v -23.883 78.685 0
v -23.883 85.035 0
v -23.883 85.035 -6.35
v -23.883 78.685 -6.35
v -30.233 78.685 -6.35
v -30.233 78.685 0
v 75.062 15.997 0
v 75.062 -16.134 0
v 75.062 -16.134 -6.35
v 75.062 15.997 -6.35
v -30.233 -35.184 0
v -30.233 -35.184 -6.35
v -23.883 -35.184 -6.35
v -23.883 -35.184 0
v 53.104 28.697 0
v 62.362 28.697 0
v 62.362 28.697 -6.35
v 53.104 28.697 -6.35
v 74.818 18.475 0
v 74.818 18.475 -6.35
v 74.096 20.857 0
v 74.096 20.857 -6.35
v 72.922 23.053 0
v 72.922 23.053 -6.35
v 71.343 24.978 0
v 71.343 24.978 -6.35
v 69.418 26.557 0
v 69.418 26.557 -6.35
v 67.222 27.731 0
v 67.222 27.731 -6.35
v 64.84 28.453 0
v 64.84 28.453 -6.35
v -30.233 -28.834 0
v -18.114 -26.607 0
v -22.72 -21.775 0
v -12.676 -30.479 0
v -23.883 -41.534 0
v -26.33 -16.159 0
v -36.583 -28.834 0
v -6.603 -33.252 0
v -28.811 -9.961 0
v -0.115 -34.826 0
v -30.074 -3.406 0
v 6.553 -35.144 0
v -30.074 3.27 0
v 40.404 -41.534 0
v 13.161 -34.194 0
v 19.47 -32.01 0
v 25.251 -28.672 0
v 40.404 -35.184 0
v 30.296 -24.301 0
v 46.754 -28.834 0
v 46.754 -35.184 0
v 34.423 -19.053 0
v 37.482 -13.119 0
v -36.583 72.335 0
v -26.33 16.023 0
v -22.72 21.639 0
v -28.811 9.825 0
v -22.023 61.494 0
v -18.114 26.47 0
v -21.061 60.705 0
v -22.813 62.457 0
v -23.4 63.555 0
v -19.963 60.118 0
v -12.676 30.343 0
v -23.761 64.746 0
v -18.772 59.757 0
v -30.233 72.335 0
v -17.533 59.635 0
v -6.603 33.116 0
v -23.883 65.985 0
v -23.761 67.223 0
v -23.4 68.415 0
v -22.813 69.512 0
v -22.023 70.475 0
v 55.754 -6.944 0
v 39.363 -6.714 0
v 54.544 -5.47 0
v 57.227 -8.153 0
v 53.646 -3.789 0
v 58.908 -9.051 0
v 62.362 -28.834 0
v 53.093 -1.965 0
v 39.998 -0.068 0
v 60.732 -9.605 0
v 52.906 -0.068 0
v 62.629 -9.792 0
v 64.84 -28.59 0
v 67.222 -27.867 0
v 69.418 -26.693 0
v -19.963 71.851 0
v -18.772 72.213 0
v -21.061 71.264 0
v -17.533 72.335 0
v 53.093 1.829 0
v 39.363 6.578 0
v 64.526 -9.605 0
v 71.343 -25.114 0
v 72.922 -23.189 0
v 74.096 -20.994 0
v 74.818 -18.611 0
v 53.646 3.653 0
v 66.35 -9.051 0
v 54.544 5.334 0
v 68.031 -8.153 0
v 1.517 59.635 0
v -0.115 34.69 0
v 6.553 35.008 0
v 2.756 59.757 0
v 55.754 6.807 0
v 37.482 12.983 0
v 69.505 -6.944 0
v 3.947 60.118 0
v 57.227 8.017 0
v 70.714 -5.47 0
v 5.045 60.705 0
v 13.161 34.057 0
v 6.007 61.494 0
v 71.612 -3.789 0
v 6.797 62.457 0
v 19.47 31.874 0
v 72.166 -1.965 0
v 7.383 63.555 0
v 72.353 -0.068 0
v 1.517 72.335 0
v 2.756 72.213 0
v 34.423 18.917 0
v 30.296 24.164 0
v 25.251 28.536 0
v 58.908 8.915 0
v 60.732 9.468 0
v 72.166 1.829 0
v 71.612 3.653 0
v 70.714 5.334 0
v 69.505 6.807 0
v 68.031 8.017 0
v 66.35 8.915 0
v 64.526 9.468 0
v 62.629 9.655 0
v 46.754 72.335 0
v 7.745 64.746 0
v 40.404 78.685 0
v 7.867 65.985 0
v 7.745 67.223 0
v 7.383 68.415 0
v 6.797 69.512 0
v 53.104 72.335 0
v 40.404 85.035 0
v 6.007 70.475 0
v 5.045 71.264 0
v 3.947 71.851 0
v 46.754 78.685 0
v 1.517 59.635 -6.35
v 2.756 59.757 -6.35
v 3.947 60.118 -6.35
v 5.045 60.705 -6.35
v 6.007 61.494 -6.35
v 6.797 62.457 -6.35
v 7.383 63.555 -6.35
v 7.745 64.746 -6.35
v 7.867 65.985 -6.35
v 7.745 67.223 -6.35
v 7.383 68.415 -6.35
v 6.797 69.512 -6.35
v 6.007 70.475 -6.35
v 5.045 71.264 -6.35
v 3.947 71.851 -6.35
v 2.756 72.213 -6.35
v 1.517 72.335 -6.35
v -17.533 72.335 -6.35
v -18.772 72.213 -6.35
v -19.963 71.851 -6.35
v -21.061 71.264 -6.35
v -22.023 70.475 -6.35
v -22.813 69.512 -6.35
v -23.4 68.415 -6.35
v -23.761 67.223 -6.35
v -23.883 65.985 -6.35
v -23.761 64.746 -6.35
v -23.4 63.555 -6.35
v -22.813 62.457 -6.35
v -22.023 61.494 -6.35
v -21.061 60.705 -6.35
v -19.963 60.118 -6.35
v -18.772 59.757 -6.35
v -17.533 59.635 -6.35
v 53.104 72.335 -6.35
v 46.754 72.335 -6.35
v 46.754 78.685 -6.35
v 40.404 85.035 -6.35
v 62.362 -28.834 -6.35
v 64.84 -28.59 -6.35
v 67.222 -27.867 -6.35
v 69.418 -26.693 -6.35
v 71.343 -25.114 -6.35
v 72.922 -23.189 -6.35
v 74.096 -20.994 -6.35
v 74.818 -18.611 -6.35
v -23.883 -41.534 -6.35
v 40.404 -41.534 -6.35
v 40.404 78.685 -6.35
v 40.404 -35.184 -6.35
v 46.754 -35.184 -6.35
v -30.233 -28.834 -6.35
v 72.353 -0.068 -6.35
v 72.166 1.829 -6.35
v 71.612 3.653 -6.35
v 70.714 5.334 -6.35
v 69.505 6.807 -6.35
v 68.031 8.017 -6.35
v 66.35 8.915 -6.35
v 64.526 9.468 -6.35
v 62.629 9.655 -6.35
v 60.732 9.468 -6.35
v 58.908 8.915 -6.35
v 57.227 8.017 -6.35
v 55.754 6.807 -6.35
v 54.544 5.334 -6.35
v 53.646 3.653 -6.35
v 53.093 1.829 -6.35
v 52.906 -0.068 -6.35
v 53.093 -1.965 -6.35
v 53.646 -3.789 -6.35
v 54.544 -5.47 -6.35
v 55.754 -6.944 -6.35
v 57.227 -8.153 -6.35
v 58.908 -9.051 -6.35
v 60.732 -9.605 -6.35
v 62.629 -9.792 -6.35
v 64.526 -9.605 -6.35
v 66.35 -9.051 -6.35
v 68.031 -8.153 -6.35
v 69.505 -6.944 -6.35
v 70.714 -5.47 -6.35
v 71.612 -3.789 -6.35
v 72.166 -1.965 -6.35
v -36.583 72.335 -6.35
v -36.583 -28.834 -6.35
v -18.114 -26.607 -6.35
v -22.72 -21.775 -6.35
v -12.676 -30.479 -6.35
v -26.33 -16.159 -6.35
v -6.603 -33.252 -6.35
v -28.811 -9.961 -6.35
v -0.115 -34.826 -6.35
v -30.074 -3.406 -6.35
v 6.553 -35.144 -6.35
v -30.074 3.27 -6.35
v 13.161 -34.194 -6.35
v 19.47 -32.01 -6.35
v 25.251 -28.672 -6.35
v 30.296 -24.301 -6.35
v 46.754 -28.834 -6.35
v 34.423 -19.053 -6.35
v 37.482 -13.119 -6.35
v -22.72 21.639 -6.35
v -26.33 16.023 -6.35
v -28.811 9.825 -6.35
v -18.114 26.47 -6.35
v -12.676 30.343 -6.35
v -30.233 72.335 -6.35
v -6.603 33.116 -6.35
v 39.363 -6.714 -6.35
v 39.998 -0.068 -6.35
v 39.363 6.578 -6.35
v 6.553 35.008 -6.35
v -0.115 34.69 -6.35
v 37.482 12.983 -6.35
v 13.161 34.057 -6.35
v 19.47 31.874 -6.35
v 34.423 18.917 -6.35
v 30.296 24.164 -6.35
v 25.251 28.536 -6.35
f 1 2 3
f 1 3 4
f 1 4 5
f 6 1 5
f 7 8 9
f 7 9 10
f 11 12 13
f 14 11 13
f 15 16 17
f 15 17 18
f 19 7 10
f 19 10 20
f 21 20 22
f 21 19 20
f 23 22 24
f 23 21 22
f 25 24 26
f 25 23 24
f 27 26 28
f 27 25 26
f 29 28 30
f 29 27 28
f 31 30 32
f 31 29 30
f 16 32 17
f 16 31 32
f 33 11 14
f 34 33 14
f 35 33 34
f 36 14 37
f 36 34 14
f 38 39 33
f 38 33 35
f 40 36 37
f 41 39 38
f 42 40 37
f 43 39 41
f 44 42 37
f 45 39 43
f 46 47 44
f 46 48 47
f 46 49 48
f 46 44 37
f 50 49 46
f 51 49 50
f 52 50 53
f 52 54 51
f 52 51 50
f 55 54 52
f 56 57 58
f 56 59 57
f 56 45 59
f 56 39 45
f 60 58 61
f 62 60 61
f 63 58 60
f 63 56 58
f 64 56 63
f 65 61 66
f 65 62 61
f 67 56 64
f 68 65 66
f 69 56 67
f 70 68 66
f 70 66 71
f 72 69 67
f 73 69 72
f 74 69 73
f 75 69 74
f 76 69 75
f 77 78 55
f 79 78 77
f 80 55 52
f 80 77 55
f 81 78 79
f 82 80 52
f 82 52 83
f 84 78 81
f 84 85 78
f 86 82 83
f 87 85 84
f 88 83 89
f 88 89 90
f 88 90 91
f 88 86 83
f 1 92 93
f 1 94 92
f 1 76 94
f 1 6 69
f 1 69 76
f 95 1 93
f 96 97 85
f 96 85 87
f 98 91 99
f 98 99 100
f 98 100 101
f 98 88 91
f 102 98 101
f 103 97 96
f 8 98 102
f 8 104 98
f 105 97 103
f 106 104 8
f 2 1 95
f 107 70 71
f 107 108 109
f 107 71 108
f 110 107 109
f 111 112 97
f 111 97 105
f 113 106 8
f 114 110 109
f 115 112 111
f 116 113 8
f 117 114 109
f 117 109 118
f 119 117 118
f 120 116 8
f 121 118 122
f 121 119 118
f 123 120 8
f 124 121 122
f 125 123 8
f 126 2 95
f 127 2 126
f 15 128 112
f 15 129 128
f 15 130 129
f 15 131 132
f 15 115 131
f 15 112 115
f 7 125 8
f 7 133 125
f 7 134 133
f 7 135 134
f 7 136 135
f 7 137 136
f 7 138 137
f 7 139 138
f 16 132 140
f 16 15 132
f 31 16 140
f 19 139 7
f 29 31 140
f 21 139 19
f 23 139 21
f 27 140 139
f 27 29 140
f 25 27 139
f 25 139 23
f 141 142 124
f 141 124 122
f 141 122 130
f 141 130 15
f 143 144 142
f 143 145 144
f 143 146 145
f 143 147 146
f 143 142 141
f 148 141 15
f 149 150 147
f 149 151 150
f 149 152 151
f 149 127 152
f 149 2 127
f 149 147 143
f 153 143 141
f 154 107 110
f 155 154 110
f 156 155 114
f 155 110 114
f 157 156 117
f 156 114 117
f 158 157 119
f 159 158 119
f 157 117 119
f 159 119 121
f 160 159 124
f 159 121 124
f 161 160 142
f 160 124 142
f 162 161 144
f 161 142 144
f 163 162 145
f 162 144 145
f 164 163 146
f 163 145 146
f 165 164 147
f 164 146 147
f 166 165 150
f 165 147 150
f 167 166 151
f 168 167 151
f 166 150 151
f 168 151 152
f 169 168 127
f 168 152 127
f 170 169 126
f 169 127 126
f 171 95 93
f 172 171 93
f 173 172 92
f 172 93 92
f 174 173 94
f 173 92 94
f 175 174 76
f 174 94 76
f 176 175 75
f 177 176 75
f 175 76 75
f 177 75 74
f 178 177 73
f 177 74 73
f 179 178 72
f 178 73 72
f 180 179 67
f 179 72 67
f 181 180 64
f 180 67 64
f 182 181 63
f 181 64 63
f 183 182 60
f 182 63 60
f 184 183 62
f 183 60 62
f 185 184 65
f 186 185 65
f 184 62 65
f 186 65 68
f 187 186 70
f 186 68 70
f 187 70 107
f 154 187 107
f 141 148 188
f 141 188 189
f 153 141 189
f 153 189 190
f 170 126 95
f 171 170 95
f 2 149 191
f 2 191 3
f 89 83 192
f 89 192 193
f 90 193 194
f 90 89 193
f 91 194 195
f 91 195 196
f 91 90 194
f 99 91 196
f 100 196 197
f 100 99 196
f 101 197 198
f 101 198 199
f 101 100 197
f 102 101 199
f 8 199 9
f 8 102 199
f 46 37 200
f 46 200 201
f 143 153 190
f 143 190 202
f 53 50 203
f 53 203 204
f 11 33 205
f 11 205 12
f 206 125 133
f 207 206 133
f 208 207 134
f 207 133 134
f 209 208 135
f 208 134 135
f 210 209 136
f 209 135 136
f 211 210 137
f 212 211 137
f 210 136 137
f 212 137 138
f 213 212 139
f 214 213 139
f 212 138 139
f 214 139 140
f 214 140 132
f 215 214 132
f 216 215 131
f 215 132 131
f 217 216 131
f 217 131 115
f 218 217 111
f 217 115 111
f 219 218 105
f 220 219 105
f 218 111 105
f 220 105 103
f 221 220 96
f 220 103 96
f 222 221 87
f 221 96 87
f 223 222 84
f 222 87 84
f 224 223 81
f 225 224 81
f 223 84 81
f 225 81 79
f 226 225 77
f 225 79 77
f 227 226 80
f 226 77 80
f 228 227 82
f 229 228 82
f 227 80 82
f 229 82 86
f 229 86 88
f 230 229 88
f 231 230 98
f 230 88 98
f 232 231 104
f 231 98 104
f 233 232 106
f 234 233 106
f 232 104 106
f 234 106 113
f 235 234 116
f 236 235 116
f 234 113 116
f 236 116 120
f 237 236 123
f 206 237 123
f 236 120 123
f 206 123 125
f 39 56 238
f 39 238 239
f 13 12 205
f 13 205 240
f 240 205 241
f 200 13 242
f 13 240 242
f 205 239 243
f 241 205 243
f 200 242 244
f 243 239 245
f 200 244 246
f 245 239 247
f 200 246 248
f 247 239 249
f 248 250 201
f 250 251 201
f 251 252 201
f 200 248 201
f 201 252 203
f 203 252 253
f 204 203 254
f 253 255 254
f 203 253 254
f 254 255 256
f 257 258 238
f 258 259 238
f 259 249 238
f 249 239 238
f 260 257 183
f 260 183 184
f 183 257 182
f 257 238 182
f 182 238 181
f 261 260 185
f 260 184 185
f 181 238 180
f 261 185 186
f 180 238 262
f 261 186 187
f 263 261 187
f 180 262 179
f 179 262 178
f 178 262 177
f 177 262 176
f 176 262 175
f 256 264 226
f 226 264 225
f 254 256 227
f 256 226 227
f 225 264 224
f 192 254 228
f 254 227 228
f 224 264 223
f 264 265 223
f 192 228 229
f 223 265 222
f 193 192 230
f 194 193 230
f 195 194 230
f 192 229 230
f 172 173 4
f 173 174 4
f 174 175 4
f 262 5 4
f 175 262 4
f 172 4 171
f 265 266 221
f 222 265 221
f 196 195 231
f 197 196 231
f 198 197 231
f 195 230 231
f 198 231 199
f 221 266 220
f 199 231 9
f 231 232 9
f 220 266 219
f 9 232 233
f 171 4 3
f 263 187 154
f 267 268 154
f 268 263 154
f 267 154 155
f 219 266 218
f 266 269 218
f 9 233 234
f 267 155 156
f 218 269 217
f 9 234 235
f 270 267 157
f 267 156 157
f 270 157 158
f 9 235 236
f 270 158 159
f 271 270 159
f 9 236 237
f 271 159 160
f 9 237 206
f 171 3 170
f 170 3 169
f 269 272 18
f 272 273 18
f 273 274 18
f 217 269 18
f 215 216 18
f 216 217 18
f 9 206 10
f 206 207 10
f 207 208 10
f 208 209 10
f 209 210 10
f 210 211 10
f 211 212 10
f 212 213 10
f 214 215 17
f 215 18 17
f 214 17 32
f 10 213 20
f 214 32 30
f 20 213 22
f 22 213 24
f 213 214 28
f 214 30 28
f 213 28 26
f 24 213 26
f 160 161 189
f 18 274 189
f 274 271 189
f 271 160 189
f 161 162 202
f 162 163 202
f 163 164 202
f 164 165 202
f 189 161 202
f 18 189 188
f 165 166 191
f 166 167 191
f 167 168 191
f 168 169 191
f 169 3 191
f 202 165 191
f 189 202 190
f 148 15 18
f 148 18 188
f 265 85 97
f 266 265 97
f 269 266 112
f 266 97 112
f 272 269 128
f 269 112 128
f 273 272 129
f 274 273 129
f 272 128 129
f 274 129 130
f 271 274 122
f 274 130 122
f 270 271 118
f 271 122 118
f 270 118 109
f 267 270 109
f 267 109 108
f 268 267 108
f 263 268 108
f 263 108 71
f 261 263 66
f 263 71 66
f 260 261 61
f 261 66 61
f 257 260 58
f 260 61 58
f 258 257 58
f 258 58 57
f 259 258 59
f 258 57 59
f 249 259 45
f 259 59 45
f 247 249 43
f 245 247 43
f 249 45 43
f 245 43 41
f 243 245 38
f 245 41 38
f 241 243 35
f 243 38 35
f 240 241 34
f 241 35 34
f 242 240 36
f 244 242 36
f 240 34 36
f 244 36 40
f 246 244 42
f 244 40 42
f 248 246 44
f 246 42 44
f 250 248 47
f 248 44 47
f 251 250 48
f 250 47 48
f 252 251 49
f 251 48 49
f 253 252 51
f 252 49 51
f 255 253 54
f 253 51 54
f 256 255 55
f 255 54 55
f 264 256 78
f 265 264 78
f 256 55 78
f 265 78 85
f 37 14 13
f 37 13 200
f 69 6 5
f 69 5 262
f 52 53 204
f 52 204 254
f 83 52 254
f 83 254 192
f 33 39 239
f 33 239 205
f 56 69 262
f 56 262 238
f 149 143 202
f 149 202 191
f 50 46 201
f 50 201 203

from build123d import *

# Parameters (mm, degrees)
SKETCH1_R           = 35.1155
SKETCH1_R_2         = 9.7234375
BOSS_EXTRUDE1_DEPTH = 6.35
CUT_EXTRUDE1_DEPTH  = 114.602654559


with BuildPart() as part:
    # Sketch1 → Boss-Extrude1 (new body)
    with BuildSketch(Plane.XY):
        with BuildLine():
            Line((75.062413888, -16.133650292), (75.062413888, 15.997349708))
            ThreePointArc((75.062413888, 15.997349708), (71.342670009, 24.977605829), (62.362413888, 28.697349708))
            Line((62.362413888, 28.697349708), (53.104113888, 28.697349708))
            Line((53.104113888, 28.697349708), (53.104113888, 72.334549708))
            Line((53.104113888, 72.334549708), (46.754113888, 72.334549708))
            Line((46.754113888, 72.334549708), (46.754113888, 78.684549708))
            Line((46.754113888, 78.684549708), (40.404113888, 78.684549708))
            Line((40.404113888, 78.684549708), (40.404113888, 85.034549708))
            Line((40.404113888, 85.034549708), (-23.883286112, 85.034549708))
            Line((-23.883286112, 85.034549708), (-23.883286112, 78.684549708))
            Line((-23.883286112, 78.684549708), (-30.233286112, 78.684549708))
            Line((-30.233286112, 78.684549708), (-30.233286112, 72.334549708))
            Line((-30.233286112, 72.334549708), (-36.583286112, 72.334549708))
            Line((-36.583286112, 72.334549708), (-36.583286112, -28.833650292))
            Line((-36.583286112, -28.833650292), (-30.233286112, -28.833650292))
            Line((-30.233286112, -28.833650292), (-30.233286112, -35.183650292))
            Line((-30.233286112, -35.183650292), (-23.883286112, -35.183650292))
            Line((-23.883286112, -35.183650292), (-23.883286112, -41.533650292))
            Line((-23.883286112, -41.533650292), (40.404113888, -41.533650292))
            Line((40.404113888, -41.533650292), (40.404113888, -35.183650292))
            Line((40.404113888, -35.183650292), (46.754113888, -35.183650292))
            Line((46.754113888, -35.183650292), (46.754113888, -28.833650292))
            Line((46.754113888, -28.833650292), (62.362413888, -28.833650292))
            ThreePointArc((62.362413888, -28.833650292), (71.342670009, -25.113906413), (75.062413888, -16.133650292))
        make_face()
        with Locations((4.882213888, -0.068150292)):
            Circle(SKETCH1_R, mode=Mode.SUBTRACT)
        with Locations((62.629113888, -0.068150292)):
            Circle(SKETCH1_R_2, mode=Mode.SUBTRACT)
    extrude(amount=-BOSS_EXTRUDE1_DEPTH)

    # Sketch2 → Cut-Extrude1 (cut, through all)
    with BuildSketch(Plane.XY):
        with BuildLine():
            Line((-17.533286112, 59.634549708), (1.516713888, 59.634549708))
            ThreePointArc((1.516713888, 59.634549708), (7.866713888, 65.984549708), (1.516713888, 72.334549708))
            Line((1.516713888, 72.334549708), (-17.533286112, 72.334549708))
            ThreePointArc((-17.533286112, 72.334549708), (-23.883286112, 65.984549708), (-17.533286112, 59.634549708))
        make_face()
    extrude(amount=-CUT_EXTRUDE1_DEPTH, mode=Mode.SUBTRACT)


solid = part.part
